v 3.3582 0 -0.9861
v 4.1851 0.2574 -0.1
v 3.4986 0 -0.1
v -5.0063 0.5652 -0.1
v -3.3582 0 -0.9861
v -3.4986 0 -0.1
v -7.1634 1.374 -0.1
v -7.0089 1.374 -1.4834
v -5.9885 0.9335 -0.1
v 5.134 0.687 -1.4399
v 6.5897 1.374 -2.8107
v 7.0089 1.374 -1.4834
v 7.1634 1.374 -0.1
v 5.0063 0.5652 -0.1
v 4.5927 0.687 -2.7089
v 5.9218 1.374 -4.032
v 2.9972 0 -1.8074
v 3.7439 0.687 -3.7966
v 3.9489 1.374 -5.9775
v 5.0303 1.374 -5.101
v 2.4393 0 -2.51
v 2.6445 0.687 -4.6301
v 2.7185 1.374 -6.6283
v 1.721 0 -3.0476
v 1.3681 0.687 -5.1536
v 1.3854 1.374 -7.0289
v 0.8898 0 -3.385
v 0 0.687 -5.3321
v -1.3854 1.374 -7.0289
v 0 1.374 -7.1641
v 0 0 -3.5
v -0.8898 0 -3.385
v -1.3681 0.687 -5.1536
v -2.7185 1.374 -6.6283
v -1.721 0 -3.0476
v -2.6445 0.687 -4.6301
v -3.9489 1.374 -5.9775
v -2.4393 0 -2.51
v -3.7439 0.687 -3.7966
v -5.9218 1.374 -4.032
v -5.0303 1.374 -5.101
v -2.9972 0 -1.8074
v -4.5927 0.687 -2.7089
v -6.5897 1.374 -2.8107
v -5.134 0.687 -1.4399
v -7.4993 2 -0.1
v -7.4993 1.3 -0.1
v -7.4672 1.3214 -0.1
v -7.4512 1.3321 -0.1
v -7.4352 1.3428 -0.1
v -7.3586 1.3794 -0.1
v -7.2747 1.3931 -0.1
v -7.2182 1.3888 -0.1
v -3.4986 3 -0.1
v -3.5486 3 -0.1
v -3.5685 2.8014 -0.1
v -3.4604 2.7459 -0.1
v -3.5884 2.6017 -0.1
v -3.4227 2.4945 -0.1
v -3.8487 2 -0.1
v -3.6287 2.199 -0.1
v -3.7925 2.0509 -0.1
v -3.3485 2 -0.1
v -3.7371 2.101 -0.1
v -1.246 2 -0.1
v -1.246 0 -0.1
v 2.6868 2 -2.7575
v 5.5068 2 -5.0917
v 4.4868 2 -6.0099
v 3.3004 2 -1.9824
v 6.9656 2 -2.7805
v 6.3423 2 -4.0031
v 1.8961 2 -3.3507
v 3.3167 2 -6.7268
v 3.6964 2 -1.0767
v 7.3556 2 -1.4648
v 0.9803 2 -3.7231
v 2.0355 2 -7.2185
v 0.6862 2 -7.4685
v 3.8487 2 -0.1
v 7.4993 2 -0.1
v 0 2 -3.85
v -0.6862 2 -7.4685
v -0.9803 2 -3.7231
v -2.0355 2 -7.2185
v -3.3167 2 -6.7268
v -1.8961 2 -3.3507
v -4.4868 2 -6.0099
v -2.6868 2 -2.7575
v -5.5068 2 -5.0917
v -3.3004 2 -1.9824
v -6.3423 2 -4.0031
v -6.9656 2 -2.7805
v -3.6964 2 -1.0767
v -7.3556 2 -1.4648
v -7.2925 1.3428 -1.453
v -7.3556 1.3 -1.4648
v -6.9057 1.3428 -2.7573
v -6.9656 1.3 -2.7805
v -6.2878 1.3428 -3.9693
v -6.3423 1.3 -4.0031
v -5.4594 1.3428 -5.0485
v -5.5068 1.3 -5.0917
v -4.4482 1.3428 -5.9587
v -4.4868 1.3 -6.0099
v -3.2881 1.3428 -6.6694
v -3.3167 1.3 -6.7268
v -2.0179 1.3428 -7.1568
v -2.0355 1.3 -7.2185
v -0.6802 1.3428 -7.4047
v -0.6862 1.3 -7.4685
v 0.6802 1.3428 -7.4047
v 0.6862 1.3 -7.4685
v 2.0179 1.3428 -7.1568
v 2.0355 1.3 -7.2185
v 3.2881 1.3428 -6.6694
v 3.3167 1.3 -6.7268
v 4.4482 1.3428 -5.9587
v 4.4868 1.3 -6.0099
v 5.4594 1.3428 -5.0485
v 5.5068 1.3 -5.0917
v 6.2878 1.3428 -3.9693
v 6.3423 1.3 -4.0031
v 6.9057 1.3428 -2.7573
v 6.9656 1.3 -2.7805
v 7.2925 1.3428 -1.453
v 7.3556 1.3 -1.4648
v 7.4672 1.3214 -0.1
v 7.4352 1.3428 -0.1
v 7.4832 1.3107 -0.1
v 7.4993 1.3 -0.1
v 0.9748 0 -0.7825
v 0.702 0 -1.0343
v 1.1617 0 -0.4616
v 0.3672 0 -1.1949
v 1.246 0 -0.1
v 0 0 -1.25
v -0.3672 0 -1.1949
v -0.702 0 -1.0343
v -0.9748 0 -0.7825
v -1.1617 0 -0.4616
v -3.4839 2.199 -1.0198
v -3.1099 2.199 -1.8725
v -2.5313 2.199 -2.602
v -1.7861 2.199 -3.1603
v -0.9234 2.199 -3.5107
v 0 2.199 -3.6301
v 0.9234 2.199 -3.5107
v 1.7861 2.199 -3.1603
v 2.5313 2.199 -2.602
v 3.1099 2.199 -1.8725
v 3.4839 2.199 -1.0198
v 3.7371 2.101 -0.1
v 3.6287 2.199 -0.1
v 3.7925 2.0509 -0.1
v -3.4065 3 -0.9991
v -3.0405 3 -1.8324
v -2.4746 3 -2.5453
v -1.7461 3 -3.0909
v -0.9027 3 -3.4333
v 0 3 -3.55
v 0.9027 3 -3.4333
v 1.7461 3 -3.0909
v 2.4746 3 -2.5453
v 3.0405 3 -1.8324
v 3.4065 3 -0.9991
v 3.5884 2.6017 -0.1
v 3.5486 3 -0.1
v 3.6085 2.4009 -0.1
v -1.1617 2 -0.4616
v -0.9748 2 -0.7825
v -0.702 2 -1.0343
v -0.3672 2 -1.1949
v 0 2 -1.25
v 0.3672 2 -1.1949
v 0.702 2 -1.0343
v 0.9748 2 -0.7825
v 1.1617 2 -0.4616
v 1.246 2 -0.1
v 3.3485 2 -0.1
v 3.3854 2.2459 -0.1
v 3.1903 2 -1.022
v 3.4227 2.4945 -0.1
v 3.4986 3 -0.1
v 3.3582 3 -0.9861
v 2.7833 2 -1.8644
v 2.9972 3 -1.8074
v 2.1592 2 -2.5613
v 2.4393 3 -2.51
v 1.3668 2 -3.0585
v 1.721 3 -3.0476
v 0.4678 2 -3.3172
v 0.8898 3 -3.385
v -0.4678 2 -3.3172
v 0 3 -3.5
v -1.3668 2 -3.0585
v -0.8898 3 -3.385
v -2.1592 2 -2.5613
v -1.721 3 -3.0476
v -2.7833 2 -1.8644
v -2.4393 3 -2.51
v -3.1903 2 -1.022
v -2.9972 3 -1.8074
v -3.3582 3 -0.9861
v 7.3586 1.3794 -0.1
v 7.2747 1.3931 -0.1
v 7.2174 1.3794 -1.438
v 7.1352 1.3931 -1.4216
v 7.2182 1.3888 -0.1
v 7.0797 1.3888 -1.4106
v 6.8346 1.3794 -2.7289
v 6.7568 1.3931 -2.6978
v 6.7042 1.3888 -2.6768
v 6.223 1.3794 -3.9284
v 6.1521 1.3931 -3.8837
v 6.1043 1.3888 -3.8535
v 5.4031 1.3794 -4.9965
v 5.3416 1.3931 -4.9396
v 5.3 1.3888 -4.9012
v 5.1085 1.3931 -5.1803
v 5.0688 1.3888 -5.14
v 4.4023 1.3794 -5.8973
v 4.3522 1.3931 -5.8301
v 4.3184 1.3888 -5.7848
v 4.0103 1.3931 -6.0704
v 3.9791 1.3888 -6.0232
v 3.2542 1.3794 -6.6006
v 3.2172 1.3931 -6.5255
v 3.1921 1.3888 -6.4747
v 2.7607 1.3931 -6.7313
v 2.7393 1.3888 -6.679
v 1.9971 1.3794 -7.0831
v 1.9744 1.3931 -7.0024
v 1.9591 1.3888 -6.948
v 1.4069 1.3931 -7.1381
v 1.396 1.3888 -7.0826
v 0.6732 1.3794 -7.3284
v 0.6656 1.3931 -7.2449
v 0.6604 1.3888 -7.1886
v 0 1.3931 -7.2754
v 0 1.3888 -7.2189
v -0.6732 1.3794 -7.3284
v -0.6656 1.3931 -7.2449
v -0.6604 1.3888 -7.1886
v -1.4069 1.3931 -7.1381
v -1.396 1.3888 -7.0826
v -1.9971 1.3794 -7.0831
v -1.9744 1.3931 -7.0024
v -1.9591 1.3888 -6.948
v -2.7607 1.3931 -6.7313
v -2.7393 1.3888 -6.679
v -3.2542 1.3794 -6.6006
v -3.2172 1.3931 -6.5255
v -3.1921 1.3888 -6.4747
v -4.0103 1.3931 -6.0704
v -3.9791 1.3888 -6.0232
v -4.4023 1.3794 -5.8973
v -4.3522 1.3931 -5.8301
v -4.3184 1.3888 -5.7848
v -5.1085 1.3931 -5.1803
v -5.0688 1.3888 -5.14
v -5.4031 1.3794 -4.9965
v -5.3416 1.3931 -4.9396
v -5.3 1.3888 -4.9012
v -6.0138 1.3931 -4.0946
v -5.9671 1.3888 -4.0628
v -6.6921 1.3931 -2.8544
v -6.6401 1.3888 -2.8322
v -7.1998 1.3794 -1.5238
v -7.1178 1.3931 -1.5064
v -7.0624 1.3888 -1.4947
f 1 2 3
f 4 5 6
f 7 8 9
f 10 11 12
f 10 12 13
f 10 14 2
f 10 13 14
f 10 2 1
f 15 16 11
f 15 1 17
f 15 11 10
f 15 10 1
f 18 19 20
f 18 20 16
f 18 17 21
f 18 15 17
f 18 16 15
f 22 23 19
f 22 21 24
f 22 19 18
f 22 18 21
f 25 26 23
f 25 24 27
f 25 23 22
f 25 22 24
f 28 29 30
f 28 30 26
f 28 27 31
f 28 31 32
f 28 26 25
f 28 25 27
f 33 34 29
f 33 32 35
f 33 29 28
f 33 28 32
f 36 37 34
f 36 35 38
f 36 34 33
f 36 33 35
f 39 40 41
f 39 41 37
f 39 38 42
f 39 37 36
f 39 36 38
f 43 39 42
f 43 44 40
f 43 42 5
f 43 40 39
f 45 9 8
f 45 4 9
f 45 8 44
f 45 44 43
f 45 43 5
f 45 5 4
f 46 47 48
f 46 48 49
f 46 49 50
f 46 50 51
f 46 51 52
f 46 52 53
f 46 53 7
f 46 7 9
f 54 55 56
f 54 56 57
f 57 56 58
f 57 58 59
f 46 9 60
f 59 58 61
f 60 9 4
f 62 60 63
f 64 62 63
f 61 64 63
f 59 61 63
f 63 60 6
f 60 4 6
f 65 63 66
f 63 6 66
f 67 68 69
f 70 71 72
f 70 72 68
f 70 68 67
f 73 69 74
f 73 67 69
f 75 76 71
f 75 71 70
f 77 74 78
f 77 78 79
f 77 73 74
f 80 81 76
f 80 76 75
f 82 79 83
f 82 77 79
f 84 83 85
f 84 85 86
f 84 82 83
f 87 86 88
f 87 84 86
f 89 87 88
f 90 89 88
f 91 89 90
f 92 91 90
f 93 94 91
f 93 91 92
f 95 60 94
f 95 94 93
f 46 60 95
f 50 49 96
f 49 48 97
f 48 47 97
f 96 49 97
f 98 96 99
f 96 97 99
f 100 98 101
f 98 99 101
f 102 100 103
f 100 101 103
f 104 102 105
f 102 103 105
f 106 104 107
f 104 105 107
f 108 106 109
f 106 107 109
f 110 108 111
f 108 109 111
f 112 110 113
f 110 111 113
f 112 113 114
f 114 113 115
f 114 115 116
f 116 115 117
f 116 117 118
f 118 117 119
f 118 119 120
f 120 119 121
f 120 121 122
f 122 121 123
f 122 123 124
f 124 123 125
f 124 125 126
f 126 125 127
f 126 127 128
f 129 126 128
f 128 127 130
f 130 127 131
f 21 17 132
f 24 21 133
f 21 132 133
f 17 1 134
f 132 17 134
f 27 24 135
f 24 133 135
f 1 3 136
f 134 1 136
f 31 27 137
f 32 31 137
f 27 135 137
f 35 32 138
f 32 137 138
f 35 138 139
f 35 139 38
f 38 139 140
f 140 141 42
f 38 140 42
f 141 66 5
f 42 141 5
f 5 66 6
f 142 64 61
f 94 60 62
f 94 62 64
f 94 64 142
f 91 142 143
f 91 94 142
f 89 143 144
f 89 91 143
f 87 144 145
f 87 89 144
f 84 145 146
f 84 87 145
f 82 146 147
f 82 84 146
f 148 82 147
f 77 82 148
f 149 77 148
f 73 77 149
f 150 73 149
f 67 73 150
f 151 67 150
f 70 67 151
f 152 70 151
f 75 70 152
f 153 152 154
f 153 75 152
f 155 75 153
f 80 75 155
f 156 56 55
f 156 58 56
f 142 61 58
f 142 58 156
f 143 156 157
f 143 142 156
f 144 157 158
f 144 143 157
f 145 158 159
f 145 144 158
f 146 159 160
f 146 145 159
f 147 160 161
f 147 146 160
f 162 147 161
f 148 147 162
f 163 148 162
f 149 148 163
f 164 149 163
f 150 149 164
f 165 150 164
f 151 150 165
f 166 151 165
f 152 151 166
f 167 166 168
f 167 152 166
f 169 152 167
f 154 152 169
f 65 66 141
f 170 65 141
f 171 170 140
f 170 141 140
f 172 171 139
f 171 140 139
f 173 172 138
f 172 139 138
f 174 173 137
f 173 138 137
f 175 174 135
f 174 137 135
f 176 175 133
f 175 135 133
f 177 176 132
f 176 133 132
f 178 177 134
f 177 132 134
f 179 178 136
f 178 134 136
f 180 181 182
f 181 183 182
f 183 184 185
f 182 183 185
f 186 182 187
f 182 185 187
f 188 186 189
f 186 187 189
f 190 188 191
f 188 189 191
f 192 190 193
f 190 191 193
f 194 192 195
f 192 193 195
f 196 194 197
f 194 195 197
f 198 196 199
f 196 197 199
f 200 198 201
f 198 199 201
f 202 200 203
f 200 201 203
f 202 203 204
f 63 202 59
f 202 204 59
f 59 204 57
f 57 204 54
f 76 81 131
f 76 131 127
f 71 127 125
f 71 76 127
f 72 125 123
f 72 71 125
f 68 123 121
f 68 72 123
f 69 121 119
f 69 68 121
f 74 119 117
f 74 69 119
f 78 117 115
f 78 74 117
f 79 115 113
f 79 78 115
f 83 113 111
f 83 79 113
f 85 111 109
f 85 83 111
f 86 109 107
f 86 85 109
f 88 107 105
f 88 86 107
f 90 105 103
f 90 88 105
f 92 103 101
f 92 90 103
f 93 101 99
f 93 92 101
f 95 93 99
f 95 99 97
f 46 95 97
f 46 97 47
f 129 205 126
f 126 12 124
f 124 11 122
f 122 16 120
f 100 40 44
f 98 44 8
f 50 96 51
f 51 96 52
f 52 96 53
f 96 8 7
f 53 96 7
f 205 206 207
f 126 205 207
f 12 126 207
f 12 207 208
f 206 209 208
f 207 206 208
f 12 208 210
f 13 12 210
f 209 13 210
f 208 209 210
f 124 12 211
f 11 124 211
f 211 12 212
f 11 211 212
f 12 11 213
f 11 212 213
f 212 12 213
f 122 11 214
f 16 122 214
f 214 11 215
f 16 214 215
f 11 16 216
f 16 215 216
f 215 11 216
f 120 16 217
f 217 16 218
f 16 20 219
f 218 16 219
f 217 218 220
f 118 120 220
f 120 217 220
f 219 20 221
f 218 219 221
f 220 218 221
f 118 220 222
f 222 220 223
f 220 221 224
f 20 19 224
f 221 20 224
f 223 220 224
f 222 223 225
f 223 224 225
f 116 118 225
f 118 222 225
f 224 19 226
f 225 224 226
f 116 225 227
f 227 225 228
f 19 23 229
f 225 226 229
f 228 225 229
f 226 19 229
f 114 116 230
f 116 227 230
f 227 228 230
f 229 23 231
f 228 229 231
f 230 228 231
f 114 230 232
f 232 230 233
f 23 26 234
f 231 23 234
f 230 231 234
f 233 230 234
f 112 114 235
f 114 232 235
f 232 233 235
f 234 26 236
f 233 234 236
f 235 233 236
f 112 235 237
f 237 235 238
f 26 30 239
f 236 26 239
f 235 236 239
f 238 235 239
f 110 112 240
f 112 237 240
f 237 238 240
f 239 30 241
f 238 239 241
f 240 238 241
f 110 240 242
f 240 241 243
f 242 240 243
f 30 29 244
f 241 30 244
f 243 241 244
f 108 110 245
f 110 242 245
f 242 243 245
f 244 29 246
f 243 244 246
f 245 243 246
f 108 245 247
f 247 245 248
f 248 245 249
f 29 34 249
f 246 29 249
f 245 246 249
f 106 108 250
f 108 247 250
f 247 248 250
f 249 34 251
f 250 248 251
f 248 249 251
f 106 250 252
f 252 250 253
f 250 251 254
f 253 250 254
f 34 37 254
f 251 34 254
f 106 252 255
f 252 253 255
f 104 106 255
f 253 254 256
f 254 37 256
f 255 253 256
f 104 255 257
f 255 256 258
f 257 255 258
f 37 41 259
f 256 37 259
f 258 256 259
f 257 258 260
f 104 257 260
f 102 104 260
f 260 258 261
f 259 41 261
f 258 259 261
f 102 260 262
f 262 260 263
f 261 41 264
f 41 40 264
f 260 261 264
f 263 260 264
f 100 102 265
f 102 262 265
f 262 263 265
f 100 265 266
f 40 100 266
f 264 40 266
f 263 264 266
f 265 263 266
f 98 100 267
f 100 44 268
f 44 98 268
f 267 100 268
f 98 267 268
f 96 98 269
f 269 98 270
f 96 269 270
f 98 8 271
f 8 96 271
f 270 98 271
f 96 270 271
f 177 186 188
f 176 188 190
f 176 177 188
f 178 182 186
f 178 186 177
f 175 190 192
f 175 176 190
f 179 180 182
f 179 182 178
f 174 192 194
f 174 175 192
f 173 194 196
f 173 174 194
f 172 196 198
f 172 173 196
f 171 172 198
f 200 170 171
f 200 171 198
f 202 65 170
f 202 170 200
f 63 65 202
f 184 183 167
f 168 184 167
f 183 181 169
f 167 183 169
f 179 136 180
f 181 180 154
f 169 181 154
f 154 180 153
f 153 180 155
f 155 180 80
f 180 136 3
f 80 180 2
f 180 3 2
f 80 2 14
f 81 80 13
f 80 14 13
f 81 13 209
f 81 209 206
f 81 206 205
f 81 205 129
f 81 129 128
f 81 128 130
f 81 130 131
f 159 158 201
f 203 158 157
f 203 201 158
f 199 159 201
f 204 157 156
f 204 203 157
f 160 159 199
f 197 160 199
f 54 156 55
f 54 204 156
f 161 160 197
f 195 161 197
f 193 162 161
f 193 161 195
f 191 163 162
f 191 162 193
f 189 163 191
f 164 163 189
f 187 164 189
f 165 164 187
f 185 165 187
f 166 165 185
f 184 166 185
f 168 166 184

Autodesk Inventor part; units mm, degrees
ref_plane "YZ Plane" through (0, 0, 0) normal (1, 0, 0) x (0, 1, 0)
ref_plane "XZ Plane" through (0, 0, 0) normal (0, 1, 0) x (-1, 0, 0)
ref_plane "XY Plane" through (0, 0, 0) normal (0, 0, 1) x (1, 0, 0)
sketch "Sketch1" plane through (0, 0, 0) normal (0, 1, 0) x (-1, 0, 0)
  circle A0 centre (0, 0) radius 1.25
  circle A1 centre (0, 0) radius 7.5
  dimension "d0" = 2.5
  dimension "d1" = 15
extrude "Body" add sketch "Sketch1" along normal blind 2
chamfer "Bottom Chamfer" distance 1.5 distance2 4 1 edges at (7.5, 0, 0) measured on face at (-7.4757, 1.3333, -0.6035)
sketch "Sketch4" plane through (0, 0, 0) normal (1, 0, 0) x (0, 1, 0)
  line L0 (2, -7.5) -> (2, 7.5)
  line L1 (2, 3.35) -> (3, 3.35)
  line L2 (3, 3.35) -> (3, 3.65)
  line L3 (3, 3.65) -> (2, 3.65)
  line L4 (2, 3.65) -> (2, 3.35)
  line L5 (2, 3.65) -> (3, 3.55)
  line L6 (2, 3.65) -> (2.311367, 3.65) construction
  line L7 (3, 3.5) -> (2, 3.35)
  line L8 (-0.462273, 0) -> (2.77364, 0)
  point P0 (0, 0)
  point P1 (2, 0)
  point P2 (2, 3.65)
  dimension "d16" = 1
  dimension "d17" = 0.3
  dimension "d18" = 3.65
  dimension "d34" = 0.1
revolve "Centering Lip" add sketch "Sketch4" angle 360 about axis through (0, -10, 0) along (0, 1, 0) contours L0 L5 L2 L7
sketch "Sketch6" plane through (0, 0, 0) normal (0, 0, 1) x (1, 0, 0)
  line L0 (7.5, 2) -> (-7.5, 2) projected
  line L1 (7.5, 2) -> (7.2, 2)
  line L2 (7.2, 2) -> (7.2, 1.3)
  line L3 (7.2, 1.3) -> (7.5, 1.3)
  line L4 (7.5, 1.3) -> (7.5, 2)
  line L5 (-7.5, 1.5) -> (7.5, 1.5) projected
  line L6 (7.5, 1.3) -> (7.2, 1.5)
  line L7 (0, -0.4) -> (0, 2.4) projected
  point P0 (0, 0)
  dimension "d27" = 0.3
  dimension "d28" = 0.7
revolve "Revolution2" add sketch "Sketch6" angle 360 about axis through (0, -10, 0) along (0, 1, 0) contours L4 L6 L5
fillet "Fillet1" radius 0.3 2 edges at (0, 1.428, 7.308) (0, 1.428, -7.308)
sketch "Sketch7" plane through (0, 0, 0) normal (0, -1, 0) x (1, 0, 0)
  line L0 (-7.5, -0.1) -> (7.5, -0.1)
  line L1 (7.5, -0.1) -> (7.5, 7.5)
  line L2 (7.5, 7.5) -> (-7.5, 7.5)
  line L3 (-7.5, 7.5) -> (-7.5, -0.1)
  circle A0 centre (0, 0) radius 7.5 projected
  point P0 (-7.499333, -0.1)
  point P1 (7.499333, -0.1)
  dimension "d31" = 0.1
sketch "Sketch7 outline for Extrusion5" plane through (0, 0, 0) normal (0, -1, 0) x (1, 0, 0)
  arc A0 (7.499333, -0.1) -> (-7.499333, -0.1) centre (0, 0) ccw
  line L0 (-7.499333, -0.1) -> (7.499333, -0.1)
extrude "Extrusion5" cut sketch "Sketch7 outline for Extrusion5" against normal through all
chamfer "Chamfer3" distance 0.2 angle 45 1 edges at (0, 2, -3.65)
properties part number "Wire Passthrough Resin Seal"
